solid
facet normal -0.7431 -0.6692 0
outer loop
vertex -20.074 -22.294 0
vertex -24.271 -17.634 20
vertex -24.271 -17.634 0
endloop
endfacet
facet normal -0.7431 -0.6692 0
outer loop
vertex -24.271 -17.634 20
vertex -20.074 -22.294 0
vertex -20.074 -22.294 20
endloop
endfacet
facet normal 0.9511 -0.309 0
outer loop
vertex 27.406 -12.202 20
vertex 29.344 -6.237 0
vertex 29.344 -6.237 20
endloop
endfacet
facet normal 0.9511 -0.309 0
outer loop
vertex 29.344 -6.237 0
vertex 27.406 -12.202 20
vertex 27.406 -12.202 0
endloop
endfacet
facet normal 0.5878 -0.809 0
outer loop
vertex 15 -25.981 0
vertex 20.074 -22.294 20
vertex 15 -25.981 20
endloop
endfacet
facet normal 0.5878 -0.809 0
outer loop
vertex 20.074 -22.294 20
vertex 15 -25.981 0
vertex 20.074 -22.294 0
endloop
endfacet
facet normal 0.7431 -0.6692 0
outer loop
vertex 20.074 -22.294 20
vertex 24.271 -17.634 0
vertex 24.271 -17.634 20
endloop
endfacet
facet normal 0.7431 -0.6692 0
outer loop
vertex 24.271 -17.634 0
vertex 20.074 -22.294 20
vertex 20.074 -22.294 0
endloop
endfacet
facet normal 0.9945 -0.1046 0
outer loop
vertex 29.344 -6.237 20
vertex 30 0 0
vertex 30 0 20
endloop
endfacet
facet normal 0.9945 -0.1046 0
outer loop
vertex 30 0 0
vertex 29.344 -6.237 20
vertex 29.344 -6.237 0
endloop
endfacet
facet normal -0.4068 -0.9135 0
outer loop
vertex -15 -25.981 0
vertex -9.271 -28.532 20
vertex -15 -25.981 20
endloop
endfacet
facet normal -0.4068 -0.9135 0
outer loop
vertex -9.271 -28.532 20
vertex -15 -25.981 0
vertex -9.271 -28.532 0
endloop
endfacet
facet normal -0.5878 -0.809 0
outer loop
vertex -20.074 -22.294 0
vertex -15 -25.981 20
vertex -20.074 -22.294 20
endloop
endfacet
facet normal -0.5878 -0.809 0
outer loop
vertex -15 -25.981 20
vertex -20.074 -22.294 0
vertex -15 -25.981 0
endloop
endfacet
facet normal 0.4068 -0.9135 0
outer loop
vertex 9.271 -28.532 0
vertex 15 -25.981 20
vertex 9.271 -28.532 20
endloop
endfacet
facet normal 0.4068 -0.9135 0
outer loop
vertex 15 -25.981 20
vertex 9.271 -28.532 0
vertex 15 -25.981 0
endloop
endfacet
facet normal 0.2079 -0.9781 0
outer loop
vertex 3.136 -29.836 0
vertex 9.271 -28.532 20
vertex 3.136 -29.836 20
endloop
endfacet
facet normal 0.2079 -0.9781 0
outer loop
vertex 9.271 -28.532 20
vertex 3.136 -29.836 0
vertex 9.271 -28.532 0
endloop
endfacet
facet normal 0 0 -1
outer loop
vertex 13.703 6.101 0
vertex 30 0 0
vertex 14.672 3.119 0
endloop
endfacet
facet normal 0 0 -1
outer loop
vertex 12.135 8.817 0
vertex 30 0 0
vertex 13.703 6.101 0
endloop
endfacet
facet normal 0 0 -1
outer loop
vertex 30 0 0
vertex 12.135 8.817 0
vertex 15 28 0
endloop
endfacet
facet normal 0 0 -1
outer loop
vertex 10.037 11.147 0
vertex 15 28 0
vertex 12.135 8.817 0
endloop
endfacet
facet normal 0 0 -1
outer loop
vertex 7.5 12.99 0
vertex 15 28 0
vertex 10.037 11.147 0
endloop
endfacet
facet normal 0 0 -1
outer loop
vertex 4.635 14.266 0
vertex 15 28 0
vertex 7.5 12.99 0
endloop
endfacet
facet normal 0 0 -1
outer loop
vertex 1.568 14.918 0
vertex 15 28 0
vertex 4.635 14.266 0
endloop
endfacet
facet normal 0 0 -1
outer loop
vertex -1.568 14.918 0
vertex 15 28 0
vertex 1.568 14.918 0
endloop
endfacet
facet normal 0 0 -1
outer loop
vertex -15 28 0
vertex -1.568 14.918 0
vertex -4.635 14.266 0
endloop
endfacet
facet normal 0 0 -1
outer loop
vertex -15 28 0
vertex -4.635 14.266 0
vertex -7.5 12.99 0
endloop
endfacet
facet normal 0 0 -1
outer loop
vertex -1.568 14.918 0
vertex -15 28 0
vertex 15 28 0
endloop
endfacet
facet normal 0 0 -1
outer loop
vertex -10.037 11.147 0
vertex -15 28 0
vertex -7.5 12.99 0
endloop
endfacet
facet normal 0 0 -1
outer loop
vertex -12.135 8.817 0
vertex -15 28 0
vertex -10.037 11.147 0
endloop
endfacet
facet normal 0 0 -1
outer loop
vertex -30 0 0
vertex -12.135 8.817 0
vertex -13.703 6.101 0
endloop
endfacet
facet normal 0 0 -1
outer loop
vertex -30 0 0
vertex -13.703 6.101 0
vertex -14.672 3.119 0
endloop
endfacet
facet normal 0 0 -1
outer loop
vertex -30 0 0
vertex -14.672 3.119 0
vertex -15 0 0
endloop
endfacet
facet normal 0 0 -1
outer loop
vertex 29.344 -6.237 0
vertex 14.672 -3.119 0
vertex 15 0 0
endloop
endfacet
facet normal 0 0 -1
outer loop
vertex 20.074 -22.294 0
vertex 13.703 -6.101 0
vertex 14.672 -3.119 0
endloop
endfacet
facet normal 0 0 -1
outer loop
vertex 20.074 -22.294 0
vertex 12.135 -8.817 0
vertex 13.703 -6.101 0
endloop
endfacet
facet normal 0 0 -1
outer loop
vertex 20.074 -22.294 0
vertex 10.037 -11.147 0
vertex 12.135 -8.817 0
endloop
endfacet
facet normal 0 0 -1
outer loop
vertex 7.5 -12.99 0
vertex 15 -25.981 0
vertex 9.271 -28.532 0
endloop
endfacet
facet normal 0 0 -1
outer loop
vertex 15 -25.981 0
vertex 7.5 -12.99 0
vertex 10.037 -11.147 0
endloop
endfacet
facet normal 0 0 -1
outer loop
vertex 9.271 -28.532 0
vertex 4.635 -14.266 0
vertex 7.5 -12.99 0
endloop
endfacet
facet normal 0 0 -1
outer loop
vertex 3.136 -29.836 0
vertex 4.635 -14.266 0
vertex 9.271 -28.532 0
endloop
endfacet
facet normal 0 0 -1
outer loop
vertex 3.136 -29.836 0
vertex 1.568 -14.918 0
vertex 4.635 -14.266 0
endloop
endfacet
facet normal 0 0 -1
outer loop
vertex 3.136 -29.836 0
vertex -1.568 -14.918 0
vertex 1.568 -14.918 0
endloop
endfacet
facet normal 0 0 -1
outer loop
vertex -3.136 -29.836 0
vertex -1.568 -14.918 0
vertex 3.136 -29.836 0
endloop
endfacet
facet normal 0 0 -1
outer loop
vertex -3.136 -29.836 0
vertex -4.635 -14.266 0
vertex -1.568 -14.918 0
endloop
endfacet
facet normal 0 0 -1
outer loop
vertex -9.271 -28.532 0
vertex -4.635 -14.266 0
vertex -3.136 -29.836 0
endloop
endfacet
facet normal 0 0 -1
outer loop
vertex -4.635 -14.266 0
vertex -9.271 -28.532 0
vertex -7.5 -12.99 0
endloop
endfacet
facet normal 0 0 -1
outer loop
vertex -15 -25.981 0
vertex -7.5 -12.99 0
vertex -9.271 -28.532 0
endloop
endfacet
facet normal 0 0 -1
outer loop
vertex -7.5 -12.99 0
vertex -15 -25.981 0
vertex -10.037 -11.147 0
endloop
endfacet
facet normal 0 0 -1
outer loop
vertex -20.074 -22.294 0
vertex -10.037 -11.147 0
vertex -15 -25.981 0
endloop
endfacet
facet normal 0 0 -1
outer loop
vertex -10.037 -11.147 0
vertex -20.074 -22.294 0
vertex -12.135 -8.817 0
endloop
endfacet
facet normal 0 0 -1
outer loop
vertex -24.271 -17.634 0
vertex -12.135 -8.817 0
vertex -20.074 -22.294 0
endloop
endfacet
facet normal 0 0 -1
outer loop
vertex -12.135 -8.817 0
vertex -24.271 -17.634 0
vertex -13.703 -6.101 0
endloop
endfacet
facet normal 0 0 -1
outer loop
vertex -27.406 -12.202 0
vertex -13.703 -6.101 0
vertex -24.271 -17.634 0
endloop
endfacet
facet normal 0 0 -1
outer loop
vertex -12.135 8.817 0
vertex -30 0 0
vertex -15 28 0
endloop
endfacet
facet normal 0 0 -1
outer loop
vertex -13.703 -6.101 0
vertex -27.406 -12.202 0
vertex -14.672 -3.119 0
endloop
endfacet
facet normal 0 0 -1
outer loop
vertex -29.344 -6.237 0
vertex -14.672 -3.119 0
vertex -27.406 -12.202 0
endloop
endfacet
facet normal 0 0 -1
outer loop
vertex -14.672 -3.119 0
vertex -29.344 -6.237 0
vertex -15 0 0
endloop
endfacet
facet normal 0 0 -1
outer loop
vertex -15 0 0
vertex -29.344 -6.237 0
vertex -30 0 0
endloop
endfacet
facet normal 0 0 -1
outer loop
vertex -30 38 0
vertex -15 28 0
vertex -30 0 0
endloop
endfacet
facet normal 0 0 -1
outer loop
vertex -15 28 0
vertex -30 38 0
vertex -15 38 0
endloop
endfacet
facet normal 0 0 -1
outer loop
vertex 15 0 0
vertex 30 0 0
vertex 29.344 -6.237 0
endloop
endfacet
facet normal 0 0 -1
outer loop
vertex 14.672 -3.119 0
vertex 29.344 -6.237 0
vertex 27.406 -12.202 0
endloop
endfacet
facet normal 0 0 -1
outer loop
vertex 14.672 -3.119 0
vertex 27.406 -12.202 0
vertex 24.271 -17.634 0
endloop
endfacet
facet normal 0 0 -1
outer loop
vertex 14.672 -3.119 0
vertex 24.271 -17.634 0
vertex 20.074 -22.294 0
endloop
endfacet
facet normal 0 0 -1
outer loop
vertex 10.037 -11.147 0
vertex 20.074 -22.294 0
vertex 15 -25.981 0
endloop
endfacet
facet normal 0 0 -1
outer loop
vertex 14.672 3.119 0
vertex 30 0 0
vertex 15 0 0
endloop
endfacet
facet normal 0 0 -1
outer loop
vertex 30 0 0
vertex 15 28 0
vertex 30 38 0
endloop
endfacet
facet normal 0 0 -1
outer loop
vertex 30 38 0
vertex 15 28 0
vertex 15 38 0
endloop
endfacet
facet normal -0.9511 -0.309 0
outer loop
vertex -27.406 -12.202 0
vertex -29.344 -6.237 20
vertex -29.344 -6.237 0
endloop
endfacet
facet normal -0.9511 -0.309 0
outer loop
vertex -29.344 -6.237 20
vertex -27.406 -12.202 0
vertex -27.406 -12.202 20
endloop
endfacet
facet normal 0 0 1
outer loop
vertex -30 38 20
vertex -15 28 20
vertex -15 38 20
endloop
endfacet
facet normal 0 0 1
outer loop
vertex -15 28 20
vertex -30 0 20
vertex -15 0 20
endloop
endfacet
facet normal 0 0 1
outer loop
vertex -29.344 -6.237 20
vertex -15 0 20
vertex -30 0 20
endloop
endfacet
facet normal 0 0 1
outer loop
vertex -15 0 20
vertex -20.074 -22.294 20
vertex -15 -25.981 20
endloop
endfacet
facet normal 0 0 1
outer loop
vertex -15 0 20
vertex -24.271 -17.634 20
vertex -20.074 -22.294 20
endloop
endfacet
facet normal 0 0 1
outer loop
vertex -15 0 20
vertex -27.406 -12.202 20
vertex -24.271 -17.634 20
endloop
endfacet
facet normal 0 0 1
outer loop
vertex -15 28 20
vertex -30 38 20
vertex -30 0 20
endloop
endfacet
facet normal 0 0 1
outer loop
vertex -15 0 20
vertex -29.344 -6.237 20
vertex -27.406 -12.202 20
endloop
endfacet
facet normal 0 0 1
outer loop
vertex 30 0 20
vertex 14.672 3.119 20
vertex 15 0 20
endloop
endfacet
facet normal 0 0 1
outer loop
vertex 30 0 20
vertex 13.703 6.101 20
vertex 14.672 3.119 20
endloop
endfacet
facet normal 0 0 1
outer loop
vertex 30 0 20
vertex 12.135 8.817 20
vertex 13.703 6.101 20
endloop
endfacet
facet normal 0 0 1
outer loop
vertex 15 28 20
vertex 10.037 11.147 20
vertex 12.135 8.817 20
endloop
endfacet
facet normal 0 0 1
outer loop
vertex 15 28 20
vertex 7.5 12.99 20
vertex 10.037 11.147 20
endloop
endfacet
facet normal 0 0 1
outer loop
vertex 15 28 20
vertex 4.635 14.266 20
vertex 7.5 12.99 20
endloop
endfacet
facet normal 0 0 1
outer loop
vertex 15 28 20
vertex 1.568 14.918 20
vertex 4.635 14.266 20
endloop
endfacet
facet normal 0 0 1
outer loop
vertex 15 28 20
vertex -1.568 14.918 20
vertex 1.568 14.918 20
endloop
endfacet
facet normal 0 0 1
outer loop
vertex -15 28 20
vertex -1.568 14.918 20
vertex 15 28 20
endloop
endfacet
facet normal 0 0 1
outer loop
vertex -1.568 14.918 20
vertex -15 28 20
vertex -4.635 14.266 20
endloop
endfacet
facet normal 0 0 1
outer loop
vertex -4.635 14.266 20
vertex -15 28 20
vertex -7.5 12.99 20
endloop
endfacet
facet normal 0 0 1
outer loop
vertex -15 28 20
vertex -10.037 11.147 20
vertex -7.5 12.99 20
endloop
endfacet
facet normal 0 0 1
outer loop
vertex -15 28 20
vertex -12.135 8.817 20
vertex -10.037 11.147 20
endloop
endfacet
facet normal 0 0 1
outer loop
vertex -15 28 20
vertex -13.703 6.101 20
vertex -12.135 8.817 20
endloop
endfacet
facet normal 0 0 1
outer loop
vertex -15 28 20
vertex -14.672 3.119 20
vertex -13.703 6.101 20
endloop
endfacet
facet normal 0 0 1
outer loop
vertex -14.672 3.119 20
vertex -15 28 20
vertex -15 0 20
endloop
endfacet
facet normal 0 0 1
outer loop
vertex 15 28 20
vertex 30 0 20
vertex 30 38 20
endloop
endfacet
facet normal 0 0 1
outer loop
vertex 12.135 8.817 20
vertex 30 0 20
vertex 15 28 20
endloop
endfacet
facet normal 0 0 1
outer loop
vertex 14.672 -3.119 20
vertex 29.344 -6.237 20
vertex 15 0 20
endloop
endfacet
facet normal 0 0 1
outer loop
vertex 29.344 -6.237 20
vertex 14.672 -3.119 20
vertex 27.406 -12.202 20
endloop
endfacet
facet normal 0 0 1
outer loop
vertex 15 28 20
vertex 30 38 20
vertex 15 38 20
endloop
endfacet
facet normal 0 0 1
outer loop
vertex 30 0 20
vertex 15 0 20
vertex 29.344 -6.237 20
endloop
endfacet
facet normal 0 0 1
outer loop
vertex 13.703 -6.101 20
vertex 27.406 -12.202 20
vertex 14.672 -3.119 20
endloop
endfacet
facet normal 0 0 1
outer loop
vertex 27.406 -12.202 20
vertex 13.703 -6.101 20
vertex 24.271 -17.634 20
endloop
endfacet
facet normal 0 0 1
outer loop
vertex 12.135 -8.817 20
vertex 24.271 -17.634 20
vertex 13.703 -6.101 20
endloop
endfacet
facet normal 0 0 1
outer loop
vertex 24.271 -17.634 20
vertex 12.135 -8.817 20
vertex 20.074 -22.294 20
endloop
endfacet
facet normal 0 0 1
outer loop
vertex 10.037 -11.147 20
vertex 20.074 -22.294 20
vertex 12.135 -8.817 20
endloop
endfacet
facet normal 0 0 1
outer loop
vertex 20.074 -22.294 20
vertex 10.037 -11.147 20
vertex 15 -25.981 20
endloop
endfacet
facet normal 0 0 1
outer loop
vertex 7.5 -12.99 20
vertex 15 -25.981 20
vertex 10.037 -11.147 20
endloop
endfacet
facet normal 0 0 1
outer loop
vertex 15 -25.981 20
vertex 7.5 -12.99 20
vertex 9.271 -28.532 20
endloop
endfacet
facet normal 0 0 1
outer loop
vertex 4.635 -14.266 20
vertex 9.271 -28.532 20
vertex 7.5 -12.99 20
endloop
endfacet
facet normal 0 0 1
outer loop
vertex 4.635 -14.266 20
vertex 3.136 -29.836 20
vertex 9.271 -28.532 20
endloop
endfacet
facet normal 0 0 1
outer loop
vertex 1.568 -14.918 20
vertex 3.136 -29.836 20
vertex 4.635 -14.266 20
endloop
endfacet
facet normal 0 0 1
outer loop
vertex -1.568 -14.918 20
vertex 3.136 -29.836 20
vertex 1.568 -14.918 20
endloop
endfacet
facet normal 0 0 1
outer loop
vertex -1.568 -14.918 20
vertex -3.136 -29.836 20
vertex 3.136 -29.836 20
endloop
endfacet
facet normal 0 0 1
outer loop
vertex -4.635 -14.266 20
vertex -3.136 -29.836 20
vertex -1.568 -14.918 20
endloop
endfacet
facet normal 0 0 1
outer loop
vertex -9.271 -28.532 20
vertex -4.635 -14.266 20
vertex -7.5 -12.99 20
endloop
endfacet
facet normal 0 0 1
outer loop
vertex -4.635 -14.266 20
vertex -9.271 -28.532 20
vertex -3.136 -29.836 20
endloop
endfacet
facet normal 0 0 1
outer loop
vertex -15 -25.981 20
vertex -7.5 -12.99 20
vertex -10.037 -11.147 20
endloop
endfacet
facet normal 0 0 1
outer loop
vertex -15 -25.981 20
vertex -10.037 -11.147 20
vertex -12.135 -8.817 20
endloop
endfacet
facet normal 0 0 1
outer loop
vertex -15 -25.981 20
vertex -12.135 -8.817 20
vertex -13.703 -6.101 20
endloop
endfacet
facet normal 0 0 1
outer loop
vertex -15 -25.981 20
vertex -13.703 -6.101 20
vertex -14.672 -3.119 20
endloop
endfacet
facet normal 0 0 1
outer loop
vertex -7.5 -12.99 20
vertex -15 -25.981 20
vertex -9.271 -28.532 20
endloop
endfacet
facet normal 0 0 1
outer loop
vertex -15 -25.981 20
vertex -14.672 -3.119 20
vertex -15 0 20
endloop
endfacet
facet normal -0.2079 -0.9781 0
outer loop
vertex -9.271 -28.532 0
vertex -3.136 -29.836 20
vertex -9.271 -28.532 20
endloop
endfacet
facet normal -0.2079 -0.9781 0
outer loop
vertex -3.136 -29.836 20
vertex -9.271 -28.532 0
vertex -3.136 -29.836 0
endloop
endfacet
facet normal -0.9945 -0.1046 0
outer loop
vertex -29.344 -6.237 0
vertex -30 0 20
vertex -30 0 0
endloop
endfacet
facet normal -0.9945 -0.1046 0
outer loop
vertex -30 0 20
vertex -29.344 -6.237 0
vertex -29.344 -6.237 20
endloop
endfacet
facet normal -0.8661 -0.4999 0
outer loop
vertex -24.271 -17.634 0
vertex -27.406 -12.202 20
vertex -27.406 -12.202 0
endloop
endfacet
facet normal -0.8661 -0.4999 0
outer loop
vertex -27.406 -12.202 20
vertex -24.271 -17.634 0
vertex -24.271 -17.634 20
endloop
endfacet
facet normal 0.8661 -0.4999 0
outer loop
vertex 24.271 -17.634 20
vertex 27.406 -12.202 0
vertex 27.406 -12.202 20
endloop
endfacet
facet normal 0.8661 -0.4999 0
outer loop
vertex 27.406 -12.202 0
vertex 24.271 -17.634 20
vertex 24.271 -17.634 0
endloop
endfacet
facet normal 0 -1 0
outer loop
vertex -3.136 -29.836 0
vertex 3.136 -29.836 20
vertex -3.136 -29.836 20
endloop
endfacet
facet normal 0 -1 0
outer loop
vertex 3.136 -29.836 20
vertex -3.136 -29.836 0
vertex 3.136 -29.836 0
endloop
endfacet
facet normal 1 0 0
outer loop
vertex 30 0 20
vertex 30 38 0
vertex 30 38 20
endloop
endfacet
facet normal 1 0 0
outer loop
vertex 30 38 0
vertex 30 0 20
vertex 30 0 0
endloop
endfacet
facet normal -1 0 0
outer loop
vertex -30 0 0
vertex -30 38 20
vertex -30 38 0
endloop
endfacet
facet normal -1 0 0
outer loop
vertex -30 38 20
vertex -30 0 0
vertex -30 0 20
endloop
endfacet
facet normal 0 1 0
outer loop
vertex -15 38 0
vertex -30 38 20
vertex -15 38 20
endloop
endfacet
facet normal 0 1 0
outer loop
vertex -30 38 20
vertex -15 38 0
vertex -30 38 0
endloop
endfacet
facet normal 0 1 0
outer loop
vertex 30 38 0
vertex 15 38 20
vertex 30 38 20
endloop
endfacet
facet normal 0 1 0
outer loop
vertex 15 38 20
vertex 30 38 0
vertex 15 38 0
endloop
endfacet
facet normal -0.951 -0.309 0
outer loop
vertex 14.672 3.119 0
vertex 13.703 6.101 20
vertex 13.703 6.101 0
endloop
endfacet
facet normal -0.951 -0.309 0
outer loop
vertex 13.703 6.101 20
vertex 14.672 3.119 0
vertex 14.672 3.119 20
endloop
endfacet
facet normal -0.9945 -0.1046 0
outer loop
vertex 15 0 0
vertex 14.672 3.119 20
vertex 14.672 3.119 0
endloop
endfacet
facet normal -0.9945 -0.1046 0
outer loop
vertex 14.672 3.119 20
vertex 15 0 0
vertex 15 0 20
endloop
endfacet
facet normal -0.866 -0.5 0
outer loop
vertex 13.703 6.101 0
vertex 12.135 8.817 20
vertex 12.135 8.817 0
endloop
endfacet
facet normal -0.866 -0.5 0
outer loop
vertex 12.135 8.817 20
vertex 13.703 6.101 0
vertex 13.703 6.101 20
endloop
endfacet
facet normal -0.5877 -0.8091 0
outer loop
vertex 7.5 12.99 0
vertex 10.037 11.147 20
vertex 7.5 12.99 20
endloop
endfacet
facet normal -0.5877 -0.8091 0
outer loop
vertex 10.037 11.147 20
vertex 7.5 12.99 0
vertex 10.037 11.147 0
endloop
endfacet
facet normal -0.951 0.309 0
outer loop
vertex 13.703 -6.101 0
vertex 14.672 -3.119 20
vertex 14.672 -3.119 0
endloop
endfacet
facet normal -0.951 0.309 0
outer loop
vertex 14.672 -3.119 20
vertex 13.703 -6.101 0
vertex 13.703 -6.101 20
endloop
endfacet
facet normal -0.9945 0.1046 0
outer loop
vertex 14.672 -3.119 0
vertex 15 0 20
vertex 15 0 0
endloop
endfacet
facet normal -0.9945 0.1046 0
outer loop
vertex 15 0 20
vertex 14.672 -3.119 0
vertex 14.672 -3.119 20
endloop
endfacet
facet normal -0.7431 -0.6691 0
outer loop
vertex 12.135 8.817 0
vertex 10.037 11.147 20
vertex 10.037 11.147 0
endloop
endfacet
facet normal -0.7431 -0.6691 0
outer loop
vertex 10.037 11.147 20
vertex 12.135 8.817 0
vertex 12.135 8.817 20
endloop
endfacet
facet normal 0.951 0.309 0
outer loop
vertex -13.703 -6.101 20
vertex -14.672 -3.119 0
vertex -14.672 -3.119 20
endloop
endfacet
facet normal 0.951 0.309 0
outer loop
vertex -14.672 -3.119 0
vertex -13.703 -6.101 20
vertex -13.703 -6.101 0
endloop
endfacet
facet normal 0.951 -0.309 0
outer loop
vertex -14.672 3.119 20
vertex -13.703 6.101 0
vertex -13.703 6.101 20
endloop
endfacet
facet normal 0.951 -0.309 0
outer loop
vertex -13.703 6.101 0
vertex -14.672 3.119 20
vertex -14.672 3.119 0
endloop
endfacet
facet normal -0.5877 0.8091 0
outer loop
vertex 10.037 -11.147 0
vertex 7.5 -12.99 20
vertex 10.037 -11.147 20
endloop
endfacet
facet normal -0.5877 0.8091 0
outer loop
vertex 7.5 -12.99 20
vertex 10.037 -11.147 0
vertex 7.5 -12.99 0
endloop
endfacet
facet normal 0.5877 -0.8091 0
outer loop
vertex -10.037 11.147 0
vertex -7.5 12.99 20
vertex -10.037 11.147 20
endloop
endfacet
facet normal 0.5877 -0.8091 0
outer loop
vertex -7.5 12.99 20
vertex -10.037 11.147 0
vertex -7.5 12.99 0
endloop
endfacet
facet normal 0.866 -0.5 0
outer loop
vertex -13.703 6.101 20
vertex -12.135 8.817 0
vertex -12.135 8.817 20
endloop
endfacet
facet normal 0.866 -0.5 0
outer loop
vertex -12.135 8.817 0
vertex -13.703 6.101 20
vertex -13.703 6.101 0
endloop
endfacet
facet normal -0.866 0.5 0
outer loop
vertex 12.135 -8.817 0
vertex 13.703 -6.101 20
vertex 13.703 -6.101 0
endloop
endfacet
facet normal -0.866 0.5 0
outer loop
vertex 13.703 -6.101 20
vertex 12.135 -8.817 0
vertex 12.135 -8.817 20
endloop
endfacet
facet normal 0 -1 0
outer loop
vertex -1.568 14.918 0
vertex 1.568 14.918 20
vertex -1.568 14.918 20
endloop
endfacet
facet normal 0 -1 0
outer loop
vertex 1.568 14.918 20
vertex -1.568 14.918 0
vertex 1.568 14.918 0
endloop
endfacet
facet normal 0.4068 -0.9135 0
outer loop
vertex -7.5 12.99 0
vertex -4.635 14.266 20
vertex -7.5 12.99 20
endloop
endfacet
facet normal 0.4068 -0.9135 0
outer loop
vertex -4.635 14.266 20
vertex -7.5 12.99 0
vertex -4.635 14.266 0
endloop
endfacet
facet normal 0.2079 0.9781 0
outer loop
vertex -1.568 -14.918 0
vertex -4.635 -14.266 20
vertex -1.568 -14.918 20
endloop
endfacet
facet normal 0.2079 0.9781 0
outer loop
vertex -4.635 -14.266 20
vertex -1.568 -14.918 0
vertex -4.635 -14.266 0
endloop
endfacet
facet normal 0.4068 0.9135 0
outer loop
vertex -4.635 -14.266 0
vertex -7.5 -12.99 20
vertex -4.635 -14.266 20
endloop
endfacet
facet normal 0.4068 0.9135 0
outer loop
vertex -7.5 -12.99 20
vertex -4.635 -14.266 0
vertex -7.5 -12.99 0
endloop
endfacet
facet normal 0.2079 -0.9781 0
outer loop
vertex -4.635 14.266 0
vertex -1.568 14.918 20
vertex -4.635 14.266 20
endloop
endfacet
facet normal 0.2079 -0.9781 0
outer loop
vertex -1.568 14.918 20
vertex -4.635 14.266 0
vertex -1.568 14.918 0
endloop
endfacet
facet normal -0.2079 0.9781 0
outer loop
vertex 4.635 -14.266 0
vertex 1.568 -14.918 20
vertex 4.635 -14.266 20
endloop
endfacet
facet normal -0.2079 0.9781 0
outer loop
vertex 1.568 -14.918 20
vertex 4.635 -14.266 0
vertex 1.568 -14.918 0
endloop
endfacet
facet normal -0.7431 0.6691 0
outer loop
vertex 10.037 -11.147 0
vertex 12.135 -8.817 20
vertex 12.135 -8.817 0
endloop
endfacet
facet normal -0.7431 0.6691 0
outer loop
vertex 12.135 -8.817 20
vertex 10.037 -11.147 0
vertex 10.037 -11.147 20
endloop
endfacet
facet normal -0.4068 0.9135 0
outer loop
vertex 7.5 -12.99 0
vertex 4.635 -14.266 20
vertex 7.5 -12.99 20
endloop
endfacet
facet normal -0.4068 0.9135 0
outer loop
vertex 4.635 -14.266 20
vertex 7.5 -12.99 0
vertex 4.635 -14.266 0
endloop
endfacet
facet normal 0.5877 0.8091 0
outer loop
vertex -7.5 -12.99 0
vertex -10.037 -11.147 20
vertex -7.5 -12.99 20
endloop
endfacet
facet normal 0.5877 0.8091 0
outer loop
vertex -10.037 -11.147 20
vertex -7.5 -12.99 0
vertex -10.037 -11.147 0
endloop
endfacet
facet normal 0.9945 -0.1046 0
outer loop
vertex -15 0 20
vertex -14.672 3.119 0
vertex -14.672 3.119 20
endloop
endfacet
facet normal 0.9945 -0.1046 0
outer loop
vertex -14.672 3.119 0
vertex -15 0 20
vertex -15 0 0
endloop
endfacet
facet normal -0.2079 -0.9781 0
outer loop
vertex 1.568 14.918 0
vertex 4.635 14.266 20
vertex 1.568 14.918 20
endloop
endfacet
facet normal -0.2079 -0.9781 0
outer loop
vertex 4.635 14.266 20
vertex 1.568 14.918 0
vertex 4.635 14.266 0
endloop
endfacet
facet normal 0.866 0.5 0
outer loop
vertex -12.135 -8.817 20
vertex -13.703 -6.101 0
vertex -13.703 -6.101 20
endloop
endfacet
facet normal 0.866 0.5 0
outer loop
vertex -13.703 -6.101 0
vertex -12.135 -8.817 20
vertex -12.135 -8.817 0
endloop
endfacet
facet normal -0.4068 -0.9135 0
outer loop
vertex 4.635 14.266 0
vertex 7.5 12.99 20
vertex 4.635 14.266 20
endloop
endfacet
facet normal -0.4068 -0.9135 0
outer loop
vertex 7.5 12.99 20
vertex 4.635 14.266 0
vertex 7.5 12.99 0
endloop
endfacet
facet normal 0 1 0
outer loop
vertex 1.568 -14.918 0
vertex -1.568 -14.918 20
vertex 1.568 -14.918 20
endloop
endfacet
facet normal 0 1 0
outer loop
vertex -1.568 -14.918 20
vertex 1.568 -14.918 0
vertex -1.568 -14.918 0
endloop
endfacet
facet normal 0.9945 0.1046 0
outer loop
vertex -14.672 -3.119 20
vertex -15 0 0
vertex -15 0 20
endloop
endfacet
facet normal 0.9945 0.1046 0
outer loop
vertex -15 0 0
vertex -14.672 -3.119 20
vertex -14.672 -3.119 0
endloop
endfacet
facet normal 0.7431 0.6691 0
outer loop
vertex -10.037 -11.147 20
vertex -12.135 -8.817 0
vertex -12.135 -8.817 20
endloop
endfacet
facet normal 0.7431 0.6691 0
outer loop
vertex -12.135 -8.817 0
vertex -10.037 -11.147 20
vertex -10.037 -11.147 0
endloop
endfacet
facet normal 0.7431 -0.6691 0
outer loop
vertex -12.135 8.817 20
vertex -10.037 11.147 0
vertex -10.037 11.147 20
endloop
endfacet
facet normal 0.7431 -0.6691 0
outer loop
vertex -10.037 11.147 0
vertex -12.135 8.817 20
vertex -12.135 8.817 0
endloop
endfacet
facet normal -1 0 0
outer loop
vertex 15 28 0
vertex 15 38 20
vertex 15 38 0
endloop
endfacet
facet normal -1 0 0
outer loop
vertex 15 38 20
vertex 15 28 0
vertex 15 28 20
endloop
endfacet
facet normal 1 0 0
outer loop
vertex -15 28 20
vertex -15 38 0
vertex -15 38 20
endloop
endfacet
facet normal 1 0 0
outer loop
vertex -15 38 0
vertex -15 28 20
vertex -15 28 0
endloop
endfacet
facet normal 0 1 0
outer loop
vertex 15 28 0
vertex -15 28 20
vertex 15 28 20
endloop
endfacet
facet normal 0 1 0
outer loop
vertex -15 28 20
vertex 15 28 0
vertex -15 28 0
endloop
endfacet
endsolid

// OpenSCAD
difference() {
    union() {
    cylinder(h=20, d=60);
    translate([-30,0,0])
    cube([60, 38, 20]);
    }

    translate([0,0,-1])
    cylinder(h=22, r=15);
    
    translate([-15, 28, -1])
    cube([30, 11, 22]);
}
